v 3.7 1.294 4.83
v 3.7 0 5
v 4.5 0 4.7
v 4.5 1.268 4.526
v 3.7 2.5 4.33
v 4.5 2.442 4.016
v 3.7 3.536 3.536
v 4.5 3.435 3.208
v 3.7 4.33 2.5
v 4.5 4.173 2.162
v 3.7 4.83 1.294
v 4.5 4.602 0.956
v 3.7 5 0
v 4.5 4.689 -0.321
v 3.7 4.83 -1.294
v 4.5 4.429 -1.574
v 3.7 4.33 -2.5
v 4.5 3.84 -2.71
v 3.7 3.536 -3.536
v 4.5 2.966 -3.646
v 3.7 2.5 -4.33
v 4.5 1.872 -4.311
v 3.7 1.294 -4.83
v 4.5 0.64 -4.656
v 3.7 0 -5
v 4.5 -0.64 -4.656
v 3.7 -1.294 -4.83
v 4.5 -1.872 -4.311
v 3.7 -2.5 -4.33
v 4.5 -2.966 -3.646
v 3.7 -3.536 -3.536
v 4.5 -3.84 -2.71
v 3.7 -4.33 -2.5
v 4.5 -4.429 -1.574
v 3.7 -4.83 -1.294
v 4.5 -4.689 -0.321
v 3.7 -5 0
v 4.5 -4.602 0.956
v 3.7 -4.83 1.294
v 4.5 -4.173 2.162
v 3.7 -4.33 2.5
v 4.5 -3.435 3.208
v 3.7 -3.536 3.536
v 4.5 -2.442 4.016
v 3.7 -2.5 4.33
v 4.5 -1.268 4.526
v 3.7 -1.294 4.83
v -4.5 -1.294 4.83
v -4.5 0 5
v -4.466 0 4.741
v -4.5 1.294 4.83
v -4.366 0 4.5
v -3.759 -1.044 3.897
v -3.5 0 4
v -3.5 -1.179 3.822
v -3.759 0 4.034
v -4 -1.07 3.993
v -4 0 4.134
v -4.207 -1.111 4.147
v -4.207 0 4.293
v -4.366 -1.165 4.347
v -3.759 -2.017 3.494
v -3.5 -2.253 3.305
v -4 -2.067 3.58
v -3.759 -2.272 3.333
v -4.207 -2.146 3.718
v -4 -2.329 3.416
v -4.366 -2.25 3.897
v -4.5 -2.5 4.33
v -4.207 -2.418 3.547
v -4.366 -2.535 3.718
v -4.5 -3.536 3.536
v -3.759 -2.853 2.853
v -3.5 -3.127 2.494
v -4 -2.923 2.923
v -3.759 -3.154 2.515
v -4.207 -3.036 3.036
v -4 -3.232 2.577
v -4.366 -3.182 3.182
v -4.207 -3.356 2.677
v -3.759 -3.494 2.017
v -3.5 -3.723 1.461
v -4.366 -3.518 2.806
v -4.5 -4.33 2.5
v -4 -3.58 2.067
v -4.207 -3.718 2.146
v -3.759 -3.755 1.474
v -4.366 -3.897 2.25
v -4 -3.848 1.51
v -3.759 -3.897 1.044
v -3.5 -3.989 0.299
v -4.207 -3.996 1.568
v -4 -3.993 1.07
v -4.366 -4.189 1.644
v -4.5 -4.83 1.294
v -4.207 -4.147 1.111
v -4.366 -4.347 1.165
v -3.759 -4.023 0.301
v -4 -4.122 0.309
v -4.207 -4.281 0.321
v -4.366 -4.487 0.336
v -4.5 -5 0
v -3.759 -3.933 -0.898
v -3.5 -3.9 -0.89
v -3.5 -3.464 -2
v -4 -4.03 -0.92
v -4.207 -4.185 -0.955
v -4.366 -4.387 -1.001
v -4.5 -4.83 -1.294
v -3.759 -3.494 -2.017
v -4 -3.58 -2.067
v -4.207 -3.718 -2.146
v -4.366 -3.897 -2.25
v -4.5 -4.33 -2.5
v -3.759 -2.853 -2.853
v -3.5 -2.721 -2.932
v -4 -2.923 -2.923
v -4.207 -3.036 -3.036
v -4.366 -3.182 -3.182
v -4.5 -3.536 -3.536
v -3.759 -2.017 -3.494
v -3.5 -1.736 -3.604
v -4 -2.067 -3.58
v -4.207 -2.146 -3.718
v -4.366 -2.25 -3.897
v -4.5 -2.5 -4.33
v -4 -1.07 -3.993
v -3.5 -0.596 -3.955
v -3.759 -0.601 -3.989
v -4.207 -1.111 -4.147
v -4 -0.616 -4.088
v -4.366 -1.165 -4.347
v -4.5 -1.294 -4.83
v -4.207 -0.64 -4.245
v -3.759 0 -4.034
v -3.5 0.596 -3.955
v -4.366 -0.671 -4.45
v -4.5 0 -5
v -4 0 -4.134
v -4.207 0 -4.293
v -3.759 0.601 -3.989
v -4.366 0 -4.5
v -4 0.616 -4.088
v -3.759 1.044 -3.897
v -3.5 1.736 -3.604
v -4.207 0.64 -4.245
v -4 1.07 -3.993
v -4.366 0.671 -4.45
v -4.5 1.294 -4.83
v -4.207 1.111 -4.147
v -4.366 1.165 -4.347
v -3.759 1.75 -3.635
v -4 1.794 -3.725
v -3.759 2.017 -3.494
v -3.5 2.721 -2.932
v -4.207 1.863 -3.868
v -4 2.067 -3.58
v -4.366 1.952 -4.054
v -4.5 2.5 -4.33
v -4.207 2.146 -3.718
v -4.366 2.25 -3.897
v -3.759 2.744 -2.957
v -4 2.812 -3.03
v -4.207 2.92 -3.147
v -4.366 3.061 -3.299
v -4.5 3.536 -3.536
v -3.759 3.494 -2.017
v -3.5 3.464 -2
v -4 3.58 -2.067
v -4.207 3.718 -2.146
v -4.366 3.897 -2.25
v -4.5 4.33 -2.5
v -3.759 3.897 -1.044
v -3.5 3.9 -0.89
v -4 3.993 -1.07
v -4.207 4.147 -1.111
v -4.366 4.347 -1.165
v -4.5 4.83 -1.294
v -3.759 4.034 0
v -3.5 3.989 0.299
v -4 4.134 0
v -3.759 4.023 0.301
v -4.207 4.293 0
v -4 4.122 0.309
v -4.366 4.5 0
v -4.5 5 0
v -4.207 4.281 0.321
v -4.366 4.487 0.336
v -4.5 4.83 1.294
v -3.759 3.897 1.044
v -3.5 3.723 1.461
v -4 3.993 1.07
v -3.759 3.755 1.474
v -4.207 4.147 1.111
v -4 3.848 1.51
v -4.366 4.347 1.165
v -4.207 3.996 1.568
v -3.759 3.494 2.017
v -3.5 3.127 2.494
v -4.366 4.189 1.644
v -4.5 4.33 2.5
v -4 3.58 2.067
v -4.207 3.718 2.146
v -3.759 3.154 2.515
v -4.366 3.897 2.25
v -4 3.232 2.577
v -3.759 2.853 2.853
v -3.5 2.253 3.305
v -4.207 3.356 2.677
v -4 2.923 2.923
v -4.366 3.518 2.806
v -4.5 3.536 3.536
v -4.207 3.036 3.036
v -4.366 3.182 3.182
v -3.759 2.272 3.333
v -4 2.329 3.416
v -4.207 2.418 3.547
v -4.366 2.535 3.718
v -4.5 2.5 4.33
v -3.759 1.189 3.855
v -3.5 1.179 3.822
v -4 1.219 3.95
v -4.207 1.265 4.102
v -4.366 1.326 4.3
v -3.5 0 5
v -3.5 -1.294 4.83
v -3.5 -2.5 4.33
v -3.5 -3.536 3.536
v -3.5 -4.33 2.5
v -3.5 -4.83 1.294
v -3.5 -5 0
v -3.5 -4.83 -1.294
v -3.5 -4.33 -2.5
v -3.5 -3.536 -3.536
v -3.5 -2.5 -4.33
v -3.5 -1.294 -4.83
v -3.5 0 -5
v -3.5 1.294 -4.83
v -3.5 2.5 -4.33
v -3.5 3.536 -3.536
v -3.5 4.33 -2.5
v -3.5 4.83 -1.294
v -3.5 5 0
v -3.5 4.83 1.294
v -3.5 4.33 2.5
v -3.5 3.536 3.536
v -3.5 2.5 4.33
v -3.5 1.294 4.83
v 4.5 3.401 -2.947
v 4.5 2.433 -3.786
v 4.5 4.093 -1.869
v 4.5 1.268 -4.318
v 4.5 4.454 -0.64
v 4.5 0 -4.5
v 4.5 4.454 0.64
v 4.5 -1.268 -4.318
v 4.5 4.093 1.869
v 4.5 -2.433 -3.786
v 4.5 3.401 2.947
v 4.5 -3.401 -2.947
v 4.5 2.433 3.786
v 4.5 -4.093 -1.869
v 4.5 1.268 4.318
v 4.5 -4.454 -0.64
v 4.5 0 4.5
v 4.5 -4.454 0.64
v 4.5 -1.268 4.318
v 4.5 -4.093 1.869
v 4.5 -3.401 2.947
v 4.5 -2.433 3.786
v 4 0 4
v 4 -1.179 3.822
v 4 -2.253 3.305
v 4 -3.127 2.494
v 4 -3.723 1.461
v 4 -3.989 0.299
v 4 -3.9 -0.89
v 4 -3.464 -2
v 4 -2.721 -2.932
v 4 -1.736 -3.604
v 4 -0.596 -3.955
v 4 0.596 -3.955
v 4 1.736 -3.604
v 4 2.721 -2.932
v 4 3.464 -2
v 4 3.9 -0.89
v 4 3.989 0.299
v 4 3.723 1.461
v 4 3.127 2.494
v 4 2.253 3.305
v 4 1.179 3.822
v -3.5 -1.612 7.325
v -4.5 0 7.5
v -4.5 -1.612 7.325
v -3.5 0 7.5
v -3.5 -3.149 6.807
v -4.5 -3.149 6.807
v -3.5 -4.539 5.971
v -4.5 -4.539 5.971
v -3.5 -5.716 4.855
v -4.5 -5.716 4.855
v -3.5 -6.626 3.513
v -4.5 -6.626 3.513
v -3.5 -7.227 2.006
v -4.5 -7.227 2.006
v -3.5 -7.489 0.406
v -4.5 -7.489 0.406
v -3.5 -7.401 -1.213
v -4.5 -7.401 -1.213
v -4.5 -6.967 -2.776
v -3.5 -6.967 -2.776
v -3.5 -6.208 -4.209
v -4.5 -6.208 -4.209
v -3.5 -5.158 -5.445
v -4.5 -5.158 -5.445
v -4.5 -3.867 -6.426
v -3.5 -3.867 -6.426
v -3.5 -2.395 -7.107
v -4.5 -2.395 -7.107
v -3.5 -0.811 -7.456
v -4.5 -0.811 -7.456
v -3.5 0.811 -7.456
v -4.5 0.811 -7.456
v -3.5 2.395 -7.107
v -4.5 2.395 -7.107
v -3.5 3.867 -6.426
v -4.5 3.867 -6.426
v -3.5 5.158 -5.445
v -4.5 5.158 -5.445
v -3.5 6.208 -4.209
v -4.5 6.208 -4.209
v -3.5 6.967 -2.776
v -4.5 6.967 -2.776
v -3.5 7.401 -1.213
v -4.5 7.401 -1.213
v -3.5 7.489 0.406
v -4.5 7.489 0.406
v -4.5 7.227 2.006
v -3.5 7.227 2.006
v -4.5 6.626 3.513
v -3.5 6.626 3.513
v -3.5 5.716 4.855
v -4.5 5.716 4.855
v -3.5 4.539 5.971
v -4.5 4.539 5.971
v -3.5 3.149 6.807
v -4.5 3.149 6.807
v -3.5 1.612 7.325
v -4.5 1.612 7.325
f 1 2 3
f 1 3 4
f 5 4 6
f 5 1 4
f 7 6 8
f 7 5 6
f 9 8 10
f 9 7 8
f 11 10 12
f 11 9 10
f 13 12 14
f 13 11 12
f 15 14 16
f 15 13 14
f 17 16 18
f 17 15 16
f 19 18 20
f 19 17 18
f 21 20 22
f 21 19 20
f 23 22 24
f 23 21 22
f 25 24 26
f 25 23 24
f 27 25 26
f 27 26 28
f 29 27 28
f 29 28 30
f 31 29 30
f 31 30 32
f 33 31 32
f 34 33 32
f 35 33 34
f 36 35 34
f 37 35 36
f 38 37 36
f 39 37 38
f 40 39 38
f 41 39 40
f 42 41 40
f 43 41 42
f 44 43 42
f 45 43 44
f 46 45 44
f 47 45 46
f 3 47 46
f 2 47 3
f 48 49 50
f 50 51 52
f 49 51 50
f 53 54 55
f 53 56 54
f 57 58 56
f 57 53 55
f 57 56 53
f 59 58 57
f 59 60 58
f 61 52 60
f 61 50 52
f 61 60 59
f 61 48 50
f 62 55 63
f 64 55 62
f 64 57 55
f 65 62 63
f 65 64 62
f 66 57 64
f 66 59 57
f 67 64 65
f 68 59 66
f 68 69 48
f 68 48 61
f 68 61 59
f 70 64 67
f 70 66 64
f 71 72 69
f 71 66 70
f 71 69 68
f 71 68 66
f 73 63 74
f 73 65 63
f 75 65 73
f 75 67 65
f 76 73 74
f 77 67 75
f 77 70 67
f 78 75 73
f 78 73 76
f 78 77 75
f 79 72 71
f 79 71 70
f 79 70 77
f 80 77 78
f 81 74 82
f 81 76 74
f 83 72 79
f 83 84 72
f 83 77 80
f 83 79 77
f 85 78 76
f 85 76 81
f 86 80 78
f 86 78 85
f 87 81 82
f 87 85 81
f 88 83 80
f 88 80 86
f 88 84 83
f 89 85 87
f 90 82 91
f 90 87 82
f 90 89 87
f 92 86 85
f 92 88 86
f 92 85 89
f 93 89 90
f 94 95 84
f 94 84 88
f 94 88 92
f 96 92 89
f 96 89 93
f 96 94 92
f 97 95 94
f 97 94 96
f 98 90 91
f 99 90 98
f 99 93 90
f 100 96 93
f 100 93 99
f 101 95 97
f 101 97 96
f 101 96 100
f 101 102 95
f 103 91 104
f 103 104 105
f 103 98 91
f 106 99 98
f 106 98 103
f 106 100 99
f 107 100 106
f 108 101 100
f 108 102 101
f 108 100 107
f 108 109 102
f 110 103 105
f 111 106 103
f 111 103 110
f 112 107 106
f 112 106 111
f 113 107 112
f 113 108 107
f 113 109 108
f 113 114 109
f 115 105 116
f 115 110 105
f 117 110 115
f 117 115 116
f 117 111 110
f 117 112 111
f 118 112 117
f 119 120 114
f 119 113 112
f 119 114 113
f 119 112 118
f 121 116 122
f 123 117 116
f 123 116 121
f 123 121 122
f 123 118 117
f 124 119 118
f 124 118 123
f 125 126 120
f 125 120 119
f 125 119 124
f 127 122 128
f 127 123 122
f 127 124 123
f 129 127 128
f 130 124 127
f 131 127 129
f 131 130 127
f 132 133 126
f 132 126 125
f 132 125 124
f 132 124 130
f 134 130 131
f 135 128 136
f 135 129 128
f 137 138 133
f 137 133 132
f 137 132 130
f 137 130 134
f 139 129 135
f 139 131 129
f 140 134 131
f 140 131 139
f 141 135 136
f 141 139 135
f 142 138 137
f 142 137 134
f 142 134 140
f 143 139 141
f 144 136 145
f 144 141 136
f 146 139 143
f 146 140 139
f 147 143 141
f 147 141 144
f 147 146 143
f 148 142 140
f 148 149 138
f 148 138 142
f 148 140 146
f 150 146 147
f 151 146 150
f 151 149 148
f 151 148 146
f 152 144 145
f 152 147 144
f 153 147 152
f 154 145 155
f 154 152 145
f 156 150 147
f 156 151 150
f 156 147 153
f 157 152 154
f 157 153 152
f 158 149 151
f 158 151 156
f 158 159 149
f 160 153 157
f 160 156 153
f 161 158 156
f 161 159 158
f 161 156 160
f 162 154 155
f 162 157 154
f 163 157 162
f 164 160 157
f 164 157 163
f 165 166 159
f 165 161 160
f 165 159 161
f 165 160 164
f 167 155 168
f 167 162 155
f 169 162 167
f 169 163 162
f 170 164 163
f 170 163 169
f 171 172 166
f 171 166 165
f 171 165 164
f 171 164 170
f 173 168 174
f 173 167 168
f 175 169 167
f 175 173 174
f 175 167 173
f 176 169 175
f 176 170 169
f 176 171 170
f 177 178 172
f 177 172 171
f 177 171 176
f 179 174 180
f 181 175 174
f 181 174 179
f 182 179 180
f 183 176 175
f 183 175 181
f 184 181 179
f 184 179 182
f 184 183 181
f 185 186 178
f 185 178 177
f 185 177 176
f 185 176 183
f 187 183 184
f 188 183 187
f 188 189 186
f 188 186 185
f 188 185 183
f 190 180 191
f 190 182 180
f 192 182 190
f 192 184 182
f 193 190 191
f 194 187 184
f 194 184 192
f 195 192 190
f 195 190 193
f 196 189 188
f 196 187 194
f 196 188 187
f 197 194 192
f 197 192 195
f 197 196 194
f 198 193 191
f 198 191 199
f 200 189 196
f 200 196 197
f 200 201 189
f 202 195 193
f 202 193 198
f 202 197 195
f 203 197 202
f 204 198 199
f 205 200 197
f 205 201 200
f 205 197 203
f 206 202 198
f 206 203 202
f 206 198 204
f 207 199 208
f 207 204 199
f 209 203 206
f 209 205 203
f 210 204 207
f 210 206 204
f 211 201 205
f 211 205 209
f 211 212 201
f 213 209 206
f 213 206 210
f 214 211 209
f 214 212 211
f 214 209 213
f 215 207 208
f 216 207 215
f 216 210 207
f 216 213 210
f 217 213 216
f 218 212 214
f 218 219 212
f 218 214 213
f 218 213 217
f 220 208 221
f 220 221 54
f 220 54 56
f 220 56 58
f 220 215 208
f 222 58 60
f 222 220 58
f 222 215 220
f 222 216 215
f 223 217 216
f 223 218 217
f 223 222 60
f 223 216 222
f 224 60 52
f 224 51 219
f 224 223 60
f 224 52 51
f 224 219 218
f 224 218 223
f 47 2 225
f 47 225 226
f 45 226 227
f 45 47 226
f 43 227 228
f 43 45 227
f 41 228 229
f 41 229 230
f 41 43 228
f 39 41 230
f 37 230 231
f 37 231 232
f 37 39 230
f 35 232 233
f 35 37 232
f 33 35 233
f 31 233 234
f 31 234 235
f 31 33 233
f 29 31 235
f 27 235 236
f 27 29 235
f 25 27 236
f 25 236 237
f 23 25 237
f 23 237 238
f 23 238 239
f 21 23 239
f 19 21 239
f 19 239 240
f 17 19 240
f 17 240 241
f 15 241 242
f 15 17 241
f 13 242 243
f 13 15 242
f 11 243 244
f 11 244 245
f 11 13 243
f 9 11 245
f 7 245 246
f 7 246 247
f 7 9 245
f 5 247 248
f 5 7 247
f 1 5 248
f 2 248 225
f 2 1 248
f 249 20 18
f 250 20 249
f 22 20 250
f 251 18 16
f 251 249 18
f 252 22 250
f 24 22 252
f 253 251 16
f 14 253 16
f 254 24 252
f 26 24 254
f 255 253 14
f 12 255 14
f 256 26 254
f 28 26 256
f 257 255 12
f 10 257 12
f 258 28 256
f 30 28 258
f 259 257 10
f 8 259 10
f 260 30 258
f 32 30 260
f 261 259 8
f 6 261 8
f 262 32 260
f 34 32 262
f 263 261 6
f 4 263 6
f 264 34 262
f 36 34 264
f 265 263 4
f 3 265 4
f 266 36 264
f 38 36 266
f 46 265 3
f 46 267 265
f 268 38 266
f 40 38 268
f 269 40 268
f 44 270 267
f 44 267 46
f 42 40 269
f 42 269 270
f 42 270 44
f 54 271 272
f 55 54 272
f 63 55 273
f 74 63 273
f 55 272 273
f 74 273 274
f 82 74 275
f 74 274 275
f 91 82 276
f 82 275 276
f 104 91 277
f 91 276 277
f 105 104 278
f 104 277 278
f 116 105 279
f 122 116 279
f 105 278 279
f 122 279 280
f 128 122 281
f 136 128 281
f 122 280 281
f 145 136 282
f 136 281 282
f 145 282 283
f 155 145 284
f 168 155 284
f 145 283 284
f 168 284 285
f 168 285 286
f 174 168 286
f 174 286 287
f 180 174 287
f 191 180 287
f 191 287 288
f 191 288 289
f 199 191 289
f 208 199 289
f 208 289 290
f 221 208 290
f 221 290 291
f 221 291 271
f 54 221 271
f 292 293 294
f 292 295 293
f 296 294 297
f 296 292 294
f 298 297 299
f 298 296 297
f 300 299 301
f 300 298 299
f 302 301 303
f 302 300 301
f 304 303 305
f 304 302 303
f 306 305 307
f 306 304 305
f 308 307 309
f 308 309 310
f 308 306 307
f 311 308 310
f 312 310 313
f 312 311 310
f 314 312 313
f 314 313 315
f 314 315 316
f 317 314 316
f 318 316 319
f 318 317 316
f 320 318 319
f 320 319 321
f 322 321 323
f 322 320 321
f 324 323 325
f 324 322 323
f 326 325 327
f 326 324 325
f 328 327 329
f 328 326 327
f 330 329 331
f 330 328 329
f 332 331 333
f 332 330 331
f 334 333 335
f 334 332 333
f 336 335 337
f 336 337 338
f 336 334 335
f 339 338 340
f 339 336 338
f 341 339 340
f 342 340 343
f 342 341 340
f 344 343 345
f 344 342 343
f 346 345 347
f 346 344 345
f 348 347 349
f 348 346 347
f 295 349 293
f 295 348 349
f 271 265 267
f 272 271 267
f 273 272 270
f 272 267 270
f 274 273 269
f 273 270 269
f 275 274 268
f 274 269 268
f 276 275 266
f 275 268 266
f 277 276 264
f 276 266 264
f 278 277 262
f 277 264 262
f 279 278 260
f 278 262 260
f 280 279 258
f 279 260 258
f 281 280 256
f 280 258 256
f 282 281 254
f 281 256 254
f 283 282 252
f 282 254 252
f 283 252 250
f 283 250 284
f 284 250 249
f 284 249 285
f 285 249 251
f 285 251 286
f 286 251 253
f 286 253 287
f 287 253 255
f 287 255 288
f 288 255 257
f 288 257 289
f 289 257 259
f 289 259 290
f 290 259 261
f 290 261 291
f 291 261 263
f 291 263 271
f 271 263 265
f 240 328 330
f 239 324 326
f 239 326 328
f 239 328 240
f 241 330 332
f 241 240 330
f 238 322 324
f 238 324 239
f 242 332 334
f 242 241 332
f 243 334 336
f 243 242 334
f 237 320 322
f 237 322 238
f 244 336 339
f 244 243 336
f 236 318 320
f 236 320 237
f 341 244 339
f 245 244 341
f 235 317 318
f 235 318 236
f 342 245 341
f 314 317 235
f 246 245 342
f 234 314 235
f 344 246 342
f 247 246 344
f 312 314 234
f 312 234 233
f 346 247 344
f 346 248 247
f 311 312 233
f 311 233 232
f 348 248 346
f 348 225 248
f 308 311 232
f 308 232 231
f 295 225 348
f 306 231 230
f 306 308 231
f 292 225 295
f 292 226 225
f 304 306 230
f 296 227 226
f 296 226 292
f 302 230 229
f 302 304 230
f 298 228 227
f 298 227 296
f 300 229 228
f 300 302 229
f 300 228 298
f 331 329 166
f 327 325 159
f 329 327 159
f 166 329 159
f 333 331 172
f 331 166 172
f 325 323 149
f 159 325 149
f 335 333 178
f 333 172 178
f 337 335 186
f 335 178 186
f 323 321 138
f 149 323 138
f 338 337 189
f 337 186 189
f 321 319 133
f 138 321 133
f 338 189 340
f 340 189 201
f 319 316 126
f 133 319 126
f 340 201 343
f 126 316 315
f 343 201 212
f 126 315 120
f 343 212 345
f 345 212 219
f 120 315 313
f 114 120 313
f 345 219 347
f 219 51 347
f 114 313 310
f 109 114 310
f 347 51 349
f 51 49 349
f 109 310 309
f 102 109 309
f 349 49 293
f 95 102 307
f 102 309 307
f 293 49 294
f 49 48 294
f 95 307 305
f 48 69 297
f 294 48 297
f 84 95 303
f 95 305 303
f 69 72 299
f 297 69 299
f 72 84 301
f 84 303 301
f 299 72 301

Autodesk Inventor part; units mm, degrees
ref_plane "YZ Plane" through (0, 0, 0) normal (1, 0, 0) x (0, 1, 0)
ref_plane "XZ Plane" through (0, 0, 0) normal (0, 1, 0) x (-1, 0, 0)
ref_plane "XY Plane" through (0, 0, 0) normal (0, 0, 1) x (1, 0, 0)
sketch "Sketch2" plane through (0, 0, 0) normal (0, 1, 0) x (-1, 0, 0)
  line L0 (4.5, 4) -> (-4.5, 4)
  line L1 (4.5, 4) -> (4.5, 7.5)
  line L2 (4.5, 7.5) -> (3.5, 7.5)
  line L3 (3.5, 7.5) -> (3.5, 5)
  line L4 (3.5, 5) -> (-4.5, 5)
  line L5 (-4.5, 5) -> (-4.5, 4)
  line L6 (4.5, 0) -> (-4.5, 0)
  point P0 (0, 0)
  point P1 (0, 0)
  dimension "d1" = 9
  dimension "d2" = 1
  dimension "d3" = 1
  dimension "d4" = 3.5
  dimension "d5" = 8
revolve "Revolution1" add sketch "Sketch2" angle 360 about axis through (-4.5, 0, 0) along (1, 0, 0)
fillet "Fillet1" radius 1 1 edges at (-4.5, 0, -4)
chamfer "Chamfer1" distance 0.5 angle 45 1 edges at (4.5, 0, -4)
chamfer "Chamfer2" distance 0.8 distance2 0.3 1 edges at (4.5, 0, -5) measured on face at (1.8333, 0.8021, 4.9353)
equation "\"d3\" = d2"
properties part number "DU BUSH" material "BC"
